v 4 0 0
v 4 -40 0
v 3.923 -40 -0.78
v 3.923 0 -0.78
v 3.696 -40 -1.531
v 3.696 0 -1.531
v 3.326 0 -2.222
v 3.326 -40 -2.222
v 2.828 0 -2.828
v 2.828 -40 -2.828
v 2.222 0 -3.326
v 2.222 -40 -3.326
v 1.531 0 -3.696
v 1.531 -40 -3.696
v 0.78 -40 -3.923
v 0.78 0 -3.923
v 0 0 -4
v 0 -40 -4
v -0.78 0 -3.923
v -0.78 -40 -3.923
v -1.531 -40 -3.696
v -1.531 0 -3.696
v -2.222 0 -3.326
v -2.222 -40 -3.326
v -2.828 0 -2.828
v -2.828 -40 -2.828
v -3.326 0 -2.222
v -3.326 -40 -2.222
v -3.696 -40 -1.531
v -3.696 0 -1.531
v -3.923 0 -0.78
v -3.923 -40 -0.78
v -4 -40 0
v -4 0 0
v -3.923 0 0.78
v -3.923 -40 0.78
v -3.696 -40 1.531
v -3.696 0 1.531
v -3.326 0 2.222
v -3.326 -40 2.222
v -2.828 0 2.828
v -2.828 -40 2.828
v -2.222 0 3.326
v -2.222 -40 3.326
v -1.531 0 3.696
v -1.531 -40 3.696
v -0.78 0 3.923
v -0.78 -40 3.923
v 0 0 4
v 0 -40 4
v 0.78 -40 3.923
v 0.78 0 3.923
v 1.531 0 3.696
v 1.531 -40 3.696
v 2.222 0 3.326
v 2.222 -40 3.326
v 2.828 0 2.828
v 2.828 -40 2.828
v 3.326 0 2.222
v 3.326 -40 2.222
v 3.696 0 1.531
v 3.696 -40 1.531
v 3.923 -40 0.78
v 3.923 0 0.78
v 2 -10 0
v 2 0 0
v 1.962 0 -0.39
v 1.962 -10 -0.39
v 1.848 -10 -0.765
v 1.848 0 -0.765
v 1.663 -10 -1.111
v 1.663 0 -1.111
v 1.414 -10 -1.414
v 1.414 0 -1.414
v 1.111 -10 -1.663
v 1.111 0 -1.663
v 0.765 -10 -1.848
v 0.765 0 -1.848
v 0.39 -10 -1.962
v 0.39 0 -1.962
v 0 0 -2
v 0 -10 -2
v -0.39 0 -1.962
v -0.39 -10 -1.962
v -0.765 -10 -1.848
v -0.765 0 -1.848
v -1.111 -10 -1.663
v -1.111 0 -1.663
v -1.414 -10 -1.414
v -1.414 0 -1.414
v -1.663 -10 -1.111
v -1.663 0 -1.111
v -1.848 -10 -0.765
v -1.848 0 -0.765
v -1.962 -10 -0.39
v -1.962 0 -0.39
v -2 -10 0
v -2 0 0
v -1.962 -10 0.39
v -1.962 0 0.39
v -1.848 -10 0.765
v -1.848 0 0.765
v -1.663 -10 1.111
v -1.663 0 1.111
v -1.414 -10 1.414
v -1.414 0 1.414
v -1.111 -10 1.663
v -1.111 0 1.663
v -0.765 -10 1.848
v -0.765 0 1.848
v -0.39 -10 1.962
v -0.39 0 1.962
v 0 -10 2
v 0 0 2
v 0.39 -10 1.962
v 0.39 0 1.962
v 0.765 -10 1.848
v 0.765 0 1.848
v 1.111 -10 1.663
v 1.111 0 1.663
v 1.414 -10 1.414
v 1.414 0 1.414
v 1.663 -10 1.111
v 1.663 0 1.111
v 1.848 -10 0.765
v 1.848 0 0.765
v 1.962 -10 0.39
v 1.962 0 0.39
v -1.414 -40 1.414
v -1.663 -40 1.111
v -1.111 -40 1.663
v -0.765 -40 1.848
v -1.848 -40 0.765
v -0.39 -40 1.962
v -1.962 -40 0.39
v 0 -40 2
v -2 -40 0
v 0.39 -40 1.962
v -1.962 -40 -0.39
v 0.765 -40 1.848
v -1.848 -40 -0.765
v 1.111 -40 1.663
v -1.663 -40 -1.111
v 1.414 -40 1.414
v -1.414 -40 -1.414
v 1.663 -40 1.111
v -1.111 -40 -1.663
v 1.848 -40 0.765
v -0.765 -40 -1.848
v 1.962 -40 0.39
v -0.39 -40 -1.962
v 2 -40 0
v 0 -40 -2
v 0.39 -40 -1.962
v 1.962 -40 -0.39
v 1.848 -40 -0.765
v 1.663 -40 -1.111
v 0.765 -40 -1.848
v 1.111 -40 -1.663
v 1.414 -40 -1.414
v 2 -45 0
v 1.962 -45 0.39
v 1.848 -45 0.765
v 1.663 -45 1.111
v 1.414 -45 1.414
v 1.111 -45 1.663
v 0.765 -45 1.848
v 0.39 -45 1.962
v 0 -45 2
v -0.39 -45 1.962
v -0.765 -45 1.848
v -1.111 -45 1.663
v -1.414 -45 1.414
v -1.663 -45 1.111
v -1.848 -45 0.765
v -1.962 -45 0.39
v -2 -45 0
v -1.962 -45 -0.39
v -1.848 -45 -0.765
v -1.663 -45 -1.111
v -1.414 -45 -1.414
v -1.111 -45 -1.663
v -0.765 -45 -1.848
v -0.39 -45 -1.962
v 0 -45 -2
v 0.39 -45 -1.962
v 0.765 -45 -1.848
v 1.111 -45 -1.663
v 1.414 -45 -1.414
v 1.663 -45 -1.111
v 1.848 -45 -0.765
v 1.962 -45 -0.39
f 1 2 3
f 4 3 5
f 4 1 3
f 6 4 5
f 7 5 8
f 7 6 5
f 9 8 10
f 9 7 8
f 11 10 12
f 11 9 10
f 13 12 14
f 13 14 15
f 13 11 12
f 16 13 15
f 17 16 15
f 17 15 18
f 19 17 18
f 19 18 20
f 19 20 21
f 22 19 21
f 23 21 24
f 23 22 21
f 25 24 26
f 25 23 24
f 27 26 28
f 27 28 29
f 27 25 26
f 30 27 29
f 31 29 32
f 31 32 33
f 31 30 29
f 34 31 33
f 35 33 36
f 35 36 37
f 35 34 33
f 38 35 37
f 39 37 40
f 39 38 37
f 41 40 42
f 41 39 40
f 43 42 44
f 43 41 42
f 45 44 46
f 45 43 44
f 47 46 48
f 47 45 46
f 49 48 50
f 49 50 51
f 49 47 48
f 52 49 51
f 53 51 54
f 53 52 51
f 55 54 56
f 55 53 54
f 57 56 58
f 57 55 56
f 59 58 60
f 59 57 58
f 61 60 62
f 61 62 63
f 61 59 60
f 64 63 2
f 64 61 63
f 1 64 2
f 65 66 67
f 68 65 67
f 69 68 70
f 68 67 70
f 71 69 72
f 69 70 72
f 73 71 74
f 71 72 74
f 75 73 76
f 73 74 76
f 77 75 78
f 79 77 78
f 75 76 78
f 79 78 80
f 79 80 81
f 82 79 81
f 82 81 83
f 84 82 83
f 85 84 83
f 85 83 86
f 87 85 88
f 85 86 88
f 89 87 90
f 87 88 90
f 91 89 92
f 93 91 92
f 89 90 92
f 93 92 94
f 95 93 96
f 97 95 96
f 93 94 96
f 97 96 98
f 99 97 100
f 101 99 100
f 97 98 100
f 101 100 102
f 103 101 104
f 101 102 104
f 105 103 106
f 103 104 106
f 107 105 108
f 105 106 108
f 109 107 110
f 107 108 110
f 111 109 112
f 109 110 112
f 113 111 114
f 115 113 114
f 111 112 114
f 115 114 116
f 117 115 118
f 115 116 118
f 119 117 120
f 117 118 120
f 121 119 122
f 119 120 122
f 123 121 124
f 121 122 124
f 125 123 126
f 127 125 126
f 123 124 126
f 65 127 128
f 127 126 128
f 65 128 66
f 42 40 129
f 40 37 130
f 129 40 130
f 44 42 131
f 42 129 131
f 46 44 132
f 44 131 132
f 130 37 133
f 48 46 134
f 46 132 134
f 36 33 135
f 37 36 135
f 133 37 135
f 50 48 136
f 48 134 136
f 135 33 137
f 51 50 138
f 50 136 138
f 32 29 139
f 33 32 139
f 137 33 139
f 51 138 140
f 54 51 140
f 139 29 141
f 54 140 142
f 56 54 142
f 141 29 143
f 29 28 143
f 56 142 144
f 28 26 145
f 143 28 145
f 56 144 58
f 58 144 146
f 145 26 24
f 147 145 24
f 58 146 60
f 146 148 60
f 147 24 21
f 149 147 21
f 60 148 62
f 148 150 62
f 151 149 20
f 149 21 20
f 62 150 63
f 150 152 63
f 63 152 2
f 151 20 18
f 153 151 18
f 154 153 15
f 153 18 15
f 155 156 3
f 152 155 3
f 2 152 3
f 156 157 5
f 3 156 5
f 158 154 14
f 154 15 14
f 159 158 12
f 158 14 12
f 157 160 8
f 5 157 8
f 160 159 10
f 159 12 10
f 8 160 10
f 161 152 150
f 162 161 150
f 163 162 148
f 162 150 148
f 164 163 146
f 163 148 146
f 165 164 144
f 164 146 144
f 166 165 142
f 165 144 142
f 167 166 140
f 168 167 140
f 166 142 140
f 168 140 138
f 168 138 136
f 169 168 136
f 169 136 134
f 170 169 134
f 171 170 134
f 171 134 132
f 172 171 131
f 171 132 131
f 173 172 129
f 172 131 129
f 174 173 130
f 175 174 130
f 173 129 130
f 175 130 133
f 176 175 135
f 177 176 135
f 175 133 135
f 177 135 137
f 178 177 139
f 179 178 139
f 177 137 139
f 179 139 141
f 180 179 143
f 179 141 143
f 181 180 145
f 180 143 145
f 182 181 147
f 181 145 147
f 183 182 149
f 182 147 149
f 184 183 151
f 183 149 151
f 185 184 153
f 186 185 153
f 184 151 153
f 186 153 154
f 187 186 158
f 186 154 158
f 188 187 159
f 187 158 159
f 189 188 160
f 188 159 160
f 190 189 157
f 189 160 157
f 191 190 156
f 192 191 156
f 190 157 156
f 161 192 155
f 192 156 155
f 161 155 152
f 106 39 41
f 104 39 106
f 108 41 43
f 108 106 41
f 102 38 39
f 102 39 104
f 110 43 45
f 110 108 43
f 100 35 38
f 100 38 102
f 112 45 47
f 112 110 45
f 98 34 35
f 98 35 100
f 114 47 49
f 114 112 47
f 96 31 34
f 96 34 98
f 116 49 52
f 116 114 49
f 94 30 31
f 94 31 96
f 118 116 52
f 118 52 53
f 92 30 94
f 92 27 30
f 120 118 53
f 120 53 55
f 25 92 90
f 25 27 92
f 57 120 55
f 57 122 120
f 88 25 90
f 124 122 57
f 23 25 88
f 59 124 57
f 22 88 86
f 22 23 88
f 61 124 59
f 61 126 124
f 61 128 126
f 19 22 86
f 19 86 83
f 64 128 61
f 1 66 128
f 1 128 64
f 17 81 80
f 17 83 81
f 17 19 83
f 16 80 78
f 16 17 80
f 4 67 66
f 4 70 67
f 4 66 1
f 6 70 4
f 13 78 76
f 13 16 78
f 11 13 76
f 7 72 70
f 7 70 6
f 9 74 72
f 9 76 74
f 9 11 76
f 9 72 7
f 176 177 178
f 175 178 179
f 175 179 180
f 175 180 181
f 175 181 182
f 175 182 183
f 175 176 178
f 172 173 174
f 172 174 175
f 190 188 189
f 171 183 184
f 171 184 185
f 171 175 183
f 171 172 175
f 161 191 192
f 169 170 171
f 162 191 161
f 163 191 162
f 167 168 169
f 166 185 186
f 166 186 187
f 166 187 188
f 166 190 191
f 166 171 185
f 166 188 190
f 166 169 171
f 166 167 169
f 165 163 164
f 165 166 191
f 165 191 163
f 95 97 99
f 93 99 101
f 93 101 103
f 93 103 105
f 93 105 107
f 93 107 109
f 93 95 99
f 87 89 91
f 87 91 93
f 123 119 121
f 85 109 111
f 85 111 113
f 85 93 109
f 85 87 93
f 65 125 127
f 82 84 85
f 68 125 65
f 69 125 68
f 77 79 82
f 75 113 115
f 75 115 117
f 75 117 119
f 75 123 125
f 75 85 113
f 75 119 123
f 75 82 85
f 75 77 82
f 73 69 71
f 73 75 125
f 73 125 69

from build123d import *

# Parameters (mm, degrees)
ESQUISSE1_R             = 4
BOSS_EXTRU_1_DEPTH      = 40
ESQUISSE3_R             = 2
ENL_V_MAT_EXTRU_1_DEPTH = 10
ESQUISSE4_R             = 2
BOSS_EXTRU_2_DEPTH      = 5


with BuildPart() as part:
    # Esquisse1 → Boss.-Extru.1 (new body)
    with BuildSketch(Plane(origin=(0, 0, 0), x_dir=(1, 0, 0), z_dir=(0, 1, 0))):
        Circle(ESQUISSE1_R)
    extrude(amount=-BOSS_EXTRU_1_DEPTH)

    # Esquisse3 → Enlèv. mat.-Extru.1 (cut)
    with BuildSketch(Plane(origin=(0, 0, 0), x_dir=(1, 0, 0), z_dir=(0, 1, 0))):
        Circle(ESQUISSE3_R)
    extrude(amount=-ENL_V_MAT_EXTRU_1_DEPTH, mode=Mode.SUBTRACT)

    # Esquisse4 → Boss.-Extru.2 (add)
    with BuildSketch(Plane.XZ.offset(40)):
        Circle(ESQUISSE4_R)
    extrude(amount=BOSS_EXTRU_2_DEPTH)


solid = part.part
